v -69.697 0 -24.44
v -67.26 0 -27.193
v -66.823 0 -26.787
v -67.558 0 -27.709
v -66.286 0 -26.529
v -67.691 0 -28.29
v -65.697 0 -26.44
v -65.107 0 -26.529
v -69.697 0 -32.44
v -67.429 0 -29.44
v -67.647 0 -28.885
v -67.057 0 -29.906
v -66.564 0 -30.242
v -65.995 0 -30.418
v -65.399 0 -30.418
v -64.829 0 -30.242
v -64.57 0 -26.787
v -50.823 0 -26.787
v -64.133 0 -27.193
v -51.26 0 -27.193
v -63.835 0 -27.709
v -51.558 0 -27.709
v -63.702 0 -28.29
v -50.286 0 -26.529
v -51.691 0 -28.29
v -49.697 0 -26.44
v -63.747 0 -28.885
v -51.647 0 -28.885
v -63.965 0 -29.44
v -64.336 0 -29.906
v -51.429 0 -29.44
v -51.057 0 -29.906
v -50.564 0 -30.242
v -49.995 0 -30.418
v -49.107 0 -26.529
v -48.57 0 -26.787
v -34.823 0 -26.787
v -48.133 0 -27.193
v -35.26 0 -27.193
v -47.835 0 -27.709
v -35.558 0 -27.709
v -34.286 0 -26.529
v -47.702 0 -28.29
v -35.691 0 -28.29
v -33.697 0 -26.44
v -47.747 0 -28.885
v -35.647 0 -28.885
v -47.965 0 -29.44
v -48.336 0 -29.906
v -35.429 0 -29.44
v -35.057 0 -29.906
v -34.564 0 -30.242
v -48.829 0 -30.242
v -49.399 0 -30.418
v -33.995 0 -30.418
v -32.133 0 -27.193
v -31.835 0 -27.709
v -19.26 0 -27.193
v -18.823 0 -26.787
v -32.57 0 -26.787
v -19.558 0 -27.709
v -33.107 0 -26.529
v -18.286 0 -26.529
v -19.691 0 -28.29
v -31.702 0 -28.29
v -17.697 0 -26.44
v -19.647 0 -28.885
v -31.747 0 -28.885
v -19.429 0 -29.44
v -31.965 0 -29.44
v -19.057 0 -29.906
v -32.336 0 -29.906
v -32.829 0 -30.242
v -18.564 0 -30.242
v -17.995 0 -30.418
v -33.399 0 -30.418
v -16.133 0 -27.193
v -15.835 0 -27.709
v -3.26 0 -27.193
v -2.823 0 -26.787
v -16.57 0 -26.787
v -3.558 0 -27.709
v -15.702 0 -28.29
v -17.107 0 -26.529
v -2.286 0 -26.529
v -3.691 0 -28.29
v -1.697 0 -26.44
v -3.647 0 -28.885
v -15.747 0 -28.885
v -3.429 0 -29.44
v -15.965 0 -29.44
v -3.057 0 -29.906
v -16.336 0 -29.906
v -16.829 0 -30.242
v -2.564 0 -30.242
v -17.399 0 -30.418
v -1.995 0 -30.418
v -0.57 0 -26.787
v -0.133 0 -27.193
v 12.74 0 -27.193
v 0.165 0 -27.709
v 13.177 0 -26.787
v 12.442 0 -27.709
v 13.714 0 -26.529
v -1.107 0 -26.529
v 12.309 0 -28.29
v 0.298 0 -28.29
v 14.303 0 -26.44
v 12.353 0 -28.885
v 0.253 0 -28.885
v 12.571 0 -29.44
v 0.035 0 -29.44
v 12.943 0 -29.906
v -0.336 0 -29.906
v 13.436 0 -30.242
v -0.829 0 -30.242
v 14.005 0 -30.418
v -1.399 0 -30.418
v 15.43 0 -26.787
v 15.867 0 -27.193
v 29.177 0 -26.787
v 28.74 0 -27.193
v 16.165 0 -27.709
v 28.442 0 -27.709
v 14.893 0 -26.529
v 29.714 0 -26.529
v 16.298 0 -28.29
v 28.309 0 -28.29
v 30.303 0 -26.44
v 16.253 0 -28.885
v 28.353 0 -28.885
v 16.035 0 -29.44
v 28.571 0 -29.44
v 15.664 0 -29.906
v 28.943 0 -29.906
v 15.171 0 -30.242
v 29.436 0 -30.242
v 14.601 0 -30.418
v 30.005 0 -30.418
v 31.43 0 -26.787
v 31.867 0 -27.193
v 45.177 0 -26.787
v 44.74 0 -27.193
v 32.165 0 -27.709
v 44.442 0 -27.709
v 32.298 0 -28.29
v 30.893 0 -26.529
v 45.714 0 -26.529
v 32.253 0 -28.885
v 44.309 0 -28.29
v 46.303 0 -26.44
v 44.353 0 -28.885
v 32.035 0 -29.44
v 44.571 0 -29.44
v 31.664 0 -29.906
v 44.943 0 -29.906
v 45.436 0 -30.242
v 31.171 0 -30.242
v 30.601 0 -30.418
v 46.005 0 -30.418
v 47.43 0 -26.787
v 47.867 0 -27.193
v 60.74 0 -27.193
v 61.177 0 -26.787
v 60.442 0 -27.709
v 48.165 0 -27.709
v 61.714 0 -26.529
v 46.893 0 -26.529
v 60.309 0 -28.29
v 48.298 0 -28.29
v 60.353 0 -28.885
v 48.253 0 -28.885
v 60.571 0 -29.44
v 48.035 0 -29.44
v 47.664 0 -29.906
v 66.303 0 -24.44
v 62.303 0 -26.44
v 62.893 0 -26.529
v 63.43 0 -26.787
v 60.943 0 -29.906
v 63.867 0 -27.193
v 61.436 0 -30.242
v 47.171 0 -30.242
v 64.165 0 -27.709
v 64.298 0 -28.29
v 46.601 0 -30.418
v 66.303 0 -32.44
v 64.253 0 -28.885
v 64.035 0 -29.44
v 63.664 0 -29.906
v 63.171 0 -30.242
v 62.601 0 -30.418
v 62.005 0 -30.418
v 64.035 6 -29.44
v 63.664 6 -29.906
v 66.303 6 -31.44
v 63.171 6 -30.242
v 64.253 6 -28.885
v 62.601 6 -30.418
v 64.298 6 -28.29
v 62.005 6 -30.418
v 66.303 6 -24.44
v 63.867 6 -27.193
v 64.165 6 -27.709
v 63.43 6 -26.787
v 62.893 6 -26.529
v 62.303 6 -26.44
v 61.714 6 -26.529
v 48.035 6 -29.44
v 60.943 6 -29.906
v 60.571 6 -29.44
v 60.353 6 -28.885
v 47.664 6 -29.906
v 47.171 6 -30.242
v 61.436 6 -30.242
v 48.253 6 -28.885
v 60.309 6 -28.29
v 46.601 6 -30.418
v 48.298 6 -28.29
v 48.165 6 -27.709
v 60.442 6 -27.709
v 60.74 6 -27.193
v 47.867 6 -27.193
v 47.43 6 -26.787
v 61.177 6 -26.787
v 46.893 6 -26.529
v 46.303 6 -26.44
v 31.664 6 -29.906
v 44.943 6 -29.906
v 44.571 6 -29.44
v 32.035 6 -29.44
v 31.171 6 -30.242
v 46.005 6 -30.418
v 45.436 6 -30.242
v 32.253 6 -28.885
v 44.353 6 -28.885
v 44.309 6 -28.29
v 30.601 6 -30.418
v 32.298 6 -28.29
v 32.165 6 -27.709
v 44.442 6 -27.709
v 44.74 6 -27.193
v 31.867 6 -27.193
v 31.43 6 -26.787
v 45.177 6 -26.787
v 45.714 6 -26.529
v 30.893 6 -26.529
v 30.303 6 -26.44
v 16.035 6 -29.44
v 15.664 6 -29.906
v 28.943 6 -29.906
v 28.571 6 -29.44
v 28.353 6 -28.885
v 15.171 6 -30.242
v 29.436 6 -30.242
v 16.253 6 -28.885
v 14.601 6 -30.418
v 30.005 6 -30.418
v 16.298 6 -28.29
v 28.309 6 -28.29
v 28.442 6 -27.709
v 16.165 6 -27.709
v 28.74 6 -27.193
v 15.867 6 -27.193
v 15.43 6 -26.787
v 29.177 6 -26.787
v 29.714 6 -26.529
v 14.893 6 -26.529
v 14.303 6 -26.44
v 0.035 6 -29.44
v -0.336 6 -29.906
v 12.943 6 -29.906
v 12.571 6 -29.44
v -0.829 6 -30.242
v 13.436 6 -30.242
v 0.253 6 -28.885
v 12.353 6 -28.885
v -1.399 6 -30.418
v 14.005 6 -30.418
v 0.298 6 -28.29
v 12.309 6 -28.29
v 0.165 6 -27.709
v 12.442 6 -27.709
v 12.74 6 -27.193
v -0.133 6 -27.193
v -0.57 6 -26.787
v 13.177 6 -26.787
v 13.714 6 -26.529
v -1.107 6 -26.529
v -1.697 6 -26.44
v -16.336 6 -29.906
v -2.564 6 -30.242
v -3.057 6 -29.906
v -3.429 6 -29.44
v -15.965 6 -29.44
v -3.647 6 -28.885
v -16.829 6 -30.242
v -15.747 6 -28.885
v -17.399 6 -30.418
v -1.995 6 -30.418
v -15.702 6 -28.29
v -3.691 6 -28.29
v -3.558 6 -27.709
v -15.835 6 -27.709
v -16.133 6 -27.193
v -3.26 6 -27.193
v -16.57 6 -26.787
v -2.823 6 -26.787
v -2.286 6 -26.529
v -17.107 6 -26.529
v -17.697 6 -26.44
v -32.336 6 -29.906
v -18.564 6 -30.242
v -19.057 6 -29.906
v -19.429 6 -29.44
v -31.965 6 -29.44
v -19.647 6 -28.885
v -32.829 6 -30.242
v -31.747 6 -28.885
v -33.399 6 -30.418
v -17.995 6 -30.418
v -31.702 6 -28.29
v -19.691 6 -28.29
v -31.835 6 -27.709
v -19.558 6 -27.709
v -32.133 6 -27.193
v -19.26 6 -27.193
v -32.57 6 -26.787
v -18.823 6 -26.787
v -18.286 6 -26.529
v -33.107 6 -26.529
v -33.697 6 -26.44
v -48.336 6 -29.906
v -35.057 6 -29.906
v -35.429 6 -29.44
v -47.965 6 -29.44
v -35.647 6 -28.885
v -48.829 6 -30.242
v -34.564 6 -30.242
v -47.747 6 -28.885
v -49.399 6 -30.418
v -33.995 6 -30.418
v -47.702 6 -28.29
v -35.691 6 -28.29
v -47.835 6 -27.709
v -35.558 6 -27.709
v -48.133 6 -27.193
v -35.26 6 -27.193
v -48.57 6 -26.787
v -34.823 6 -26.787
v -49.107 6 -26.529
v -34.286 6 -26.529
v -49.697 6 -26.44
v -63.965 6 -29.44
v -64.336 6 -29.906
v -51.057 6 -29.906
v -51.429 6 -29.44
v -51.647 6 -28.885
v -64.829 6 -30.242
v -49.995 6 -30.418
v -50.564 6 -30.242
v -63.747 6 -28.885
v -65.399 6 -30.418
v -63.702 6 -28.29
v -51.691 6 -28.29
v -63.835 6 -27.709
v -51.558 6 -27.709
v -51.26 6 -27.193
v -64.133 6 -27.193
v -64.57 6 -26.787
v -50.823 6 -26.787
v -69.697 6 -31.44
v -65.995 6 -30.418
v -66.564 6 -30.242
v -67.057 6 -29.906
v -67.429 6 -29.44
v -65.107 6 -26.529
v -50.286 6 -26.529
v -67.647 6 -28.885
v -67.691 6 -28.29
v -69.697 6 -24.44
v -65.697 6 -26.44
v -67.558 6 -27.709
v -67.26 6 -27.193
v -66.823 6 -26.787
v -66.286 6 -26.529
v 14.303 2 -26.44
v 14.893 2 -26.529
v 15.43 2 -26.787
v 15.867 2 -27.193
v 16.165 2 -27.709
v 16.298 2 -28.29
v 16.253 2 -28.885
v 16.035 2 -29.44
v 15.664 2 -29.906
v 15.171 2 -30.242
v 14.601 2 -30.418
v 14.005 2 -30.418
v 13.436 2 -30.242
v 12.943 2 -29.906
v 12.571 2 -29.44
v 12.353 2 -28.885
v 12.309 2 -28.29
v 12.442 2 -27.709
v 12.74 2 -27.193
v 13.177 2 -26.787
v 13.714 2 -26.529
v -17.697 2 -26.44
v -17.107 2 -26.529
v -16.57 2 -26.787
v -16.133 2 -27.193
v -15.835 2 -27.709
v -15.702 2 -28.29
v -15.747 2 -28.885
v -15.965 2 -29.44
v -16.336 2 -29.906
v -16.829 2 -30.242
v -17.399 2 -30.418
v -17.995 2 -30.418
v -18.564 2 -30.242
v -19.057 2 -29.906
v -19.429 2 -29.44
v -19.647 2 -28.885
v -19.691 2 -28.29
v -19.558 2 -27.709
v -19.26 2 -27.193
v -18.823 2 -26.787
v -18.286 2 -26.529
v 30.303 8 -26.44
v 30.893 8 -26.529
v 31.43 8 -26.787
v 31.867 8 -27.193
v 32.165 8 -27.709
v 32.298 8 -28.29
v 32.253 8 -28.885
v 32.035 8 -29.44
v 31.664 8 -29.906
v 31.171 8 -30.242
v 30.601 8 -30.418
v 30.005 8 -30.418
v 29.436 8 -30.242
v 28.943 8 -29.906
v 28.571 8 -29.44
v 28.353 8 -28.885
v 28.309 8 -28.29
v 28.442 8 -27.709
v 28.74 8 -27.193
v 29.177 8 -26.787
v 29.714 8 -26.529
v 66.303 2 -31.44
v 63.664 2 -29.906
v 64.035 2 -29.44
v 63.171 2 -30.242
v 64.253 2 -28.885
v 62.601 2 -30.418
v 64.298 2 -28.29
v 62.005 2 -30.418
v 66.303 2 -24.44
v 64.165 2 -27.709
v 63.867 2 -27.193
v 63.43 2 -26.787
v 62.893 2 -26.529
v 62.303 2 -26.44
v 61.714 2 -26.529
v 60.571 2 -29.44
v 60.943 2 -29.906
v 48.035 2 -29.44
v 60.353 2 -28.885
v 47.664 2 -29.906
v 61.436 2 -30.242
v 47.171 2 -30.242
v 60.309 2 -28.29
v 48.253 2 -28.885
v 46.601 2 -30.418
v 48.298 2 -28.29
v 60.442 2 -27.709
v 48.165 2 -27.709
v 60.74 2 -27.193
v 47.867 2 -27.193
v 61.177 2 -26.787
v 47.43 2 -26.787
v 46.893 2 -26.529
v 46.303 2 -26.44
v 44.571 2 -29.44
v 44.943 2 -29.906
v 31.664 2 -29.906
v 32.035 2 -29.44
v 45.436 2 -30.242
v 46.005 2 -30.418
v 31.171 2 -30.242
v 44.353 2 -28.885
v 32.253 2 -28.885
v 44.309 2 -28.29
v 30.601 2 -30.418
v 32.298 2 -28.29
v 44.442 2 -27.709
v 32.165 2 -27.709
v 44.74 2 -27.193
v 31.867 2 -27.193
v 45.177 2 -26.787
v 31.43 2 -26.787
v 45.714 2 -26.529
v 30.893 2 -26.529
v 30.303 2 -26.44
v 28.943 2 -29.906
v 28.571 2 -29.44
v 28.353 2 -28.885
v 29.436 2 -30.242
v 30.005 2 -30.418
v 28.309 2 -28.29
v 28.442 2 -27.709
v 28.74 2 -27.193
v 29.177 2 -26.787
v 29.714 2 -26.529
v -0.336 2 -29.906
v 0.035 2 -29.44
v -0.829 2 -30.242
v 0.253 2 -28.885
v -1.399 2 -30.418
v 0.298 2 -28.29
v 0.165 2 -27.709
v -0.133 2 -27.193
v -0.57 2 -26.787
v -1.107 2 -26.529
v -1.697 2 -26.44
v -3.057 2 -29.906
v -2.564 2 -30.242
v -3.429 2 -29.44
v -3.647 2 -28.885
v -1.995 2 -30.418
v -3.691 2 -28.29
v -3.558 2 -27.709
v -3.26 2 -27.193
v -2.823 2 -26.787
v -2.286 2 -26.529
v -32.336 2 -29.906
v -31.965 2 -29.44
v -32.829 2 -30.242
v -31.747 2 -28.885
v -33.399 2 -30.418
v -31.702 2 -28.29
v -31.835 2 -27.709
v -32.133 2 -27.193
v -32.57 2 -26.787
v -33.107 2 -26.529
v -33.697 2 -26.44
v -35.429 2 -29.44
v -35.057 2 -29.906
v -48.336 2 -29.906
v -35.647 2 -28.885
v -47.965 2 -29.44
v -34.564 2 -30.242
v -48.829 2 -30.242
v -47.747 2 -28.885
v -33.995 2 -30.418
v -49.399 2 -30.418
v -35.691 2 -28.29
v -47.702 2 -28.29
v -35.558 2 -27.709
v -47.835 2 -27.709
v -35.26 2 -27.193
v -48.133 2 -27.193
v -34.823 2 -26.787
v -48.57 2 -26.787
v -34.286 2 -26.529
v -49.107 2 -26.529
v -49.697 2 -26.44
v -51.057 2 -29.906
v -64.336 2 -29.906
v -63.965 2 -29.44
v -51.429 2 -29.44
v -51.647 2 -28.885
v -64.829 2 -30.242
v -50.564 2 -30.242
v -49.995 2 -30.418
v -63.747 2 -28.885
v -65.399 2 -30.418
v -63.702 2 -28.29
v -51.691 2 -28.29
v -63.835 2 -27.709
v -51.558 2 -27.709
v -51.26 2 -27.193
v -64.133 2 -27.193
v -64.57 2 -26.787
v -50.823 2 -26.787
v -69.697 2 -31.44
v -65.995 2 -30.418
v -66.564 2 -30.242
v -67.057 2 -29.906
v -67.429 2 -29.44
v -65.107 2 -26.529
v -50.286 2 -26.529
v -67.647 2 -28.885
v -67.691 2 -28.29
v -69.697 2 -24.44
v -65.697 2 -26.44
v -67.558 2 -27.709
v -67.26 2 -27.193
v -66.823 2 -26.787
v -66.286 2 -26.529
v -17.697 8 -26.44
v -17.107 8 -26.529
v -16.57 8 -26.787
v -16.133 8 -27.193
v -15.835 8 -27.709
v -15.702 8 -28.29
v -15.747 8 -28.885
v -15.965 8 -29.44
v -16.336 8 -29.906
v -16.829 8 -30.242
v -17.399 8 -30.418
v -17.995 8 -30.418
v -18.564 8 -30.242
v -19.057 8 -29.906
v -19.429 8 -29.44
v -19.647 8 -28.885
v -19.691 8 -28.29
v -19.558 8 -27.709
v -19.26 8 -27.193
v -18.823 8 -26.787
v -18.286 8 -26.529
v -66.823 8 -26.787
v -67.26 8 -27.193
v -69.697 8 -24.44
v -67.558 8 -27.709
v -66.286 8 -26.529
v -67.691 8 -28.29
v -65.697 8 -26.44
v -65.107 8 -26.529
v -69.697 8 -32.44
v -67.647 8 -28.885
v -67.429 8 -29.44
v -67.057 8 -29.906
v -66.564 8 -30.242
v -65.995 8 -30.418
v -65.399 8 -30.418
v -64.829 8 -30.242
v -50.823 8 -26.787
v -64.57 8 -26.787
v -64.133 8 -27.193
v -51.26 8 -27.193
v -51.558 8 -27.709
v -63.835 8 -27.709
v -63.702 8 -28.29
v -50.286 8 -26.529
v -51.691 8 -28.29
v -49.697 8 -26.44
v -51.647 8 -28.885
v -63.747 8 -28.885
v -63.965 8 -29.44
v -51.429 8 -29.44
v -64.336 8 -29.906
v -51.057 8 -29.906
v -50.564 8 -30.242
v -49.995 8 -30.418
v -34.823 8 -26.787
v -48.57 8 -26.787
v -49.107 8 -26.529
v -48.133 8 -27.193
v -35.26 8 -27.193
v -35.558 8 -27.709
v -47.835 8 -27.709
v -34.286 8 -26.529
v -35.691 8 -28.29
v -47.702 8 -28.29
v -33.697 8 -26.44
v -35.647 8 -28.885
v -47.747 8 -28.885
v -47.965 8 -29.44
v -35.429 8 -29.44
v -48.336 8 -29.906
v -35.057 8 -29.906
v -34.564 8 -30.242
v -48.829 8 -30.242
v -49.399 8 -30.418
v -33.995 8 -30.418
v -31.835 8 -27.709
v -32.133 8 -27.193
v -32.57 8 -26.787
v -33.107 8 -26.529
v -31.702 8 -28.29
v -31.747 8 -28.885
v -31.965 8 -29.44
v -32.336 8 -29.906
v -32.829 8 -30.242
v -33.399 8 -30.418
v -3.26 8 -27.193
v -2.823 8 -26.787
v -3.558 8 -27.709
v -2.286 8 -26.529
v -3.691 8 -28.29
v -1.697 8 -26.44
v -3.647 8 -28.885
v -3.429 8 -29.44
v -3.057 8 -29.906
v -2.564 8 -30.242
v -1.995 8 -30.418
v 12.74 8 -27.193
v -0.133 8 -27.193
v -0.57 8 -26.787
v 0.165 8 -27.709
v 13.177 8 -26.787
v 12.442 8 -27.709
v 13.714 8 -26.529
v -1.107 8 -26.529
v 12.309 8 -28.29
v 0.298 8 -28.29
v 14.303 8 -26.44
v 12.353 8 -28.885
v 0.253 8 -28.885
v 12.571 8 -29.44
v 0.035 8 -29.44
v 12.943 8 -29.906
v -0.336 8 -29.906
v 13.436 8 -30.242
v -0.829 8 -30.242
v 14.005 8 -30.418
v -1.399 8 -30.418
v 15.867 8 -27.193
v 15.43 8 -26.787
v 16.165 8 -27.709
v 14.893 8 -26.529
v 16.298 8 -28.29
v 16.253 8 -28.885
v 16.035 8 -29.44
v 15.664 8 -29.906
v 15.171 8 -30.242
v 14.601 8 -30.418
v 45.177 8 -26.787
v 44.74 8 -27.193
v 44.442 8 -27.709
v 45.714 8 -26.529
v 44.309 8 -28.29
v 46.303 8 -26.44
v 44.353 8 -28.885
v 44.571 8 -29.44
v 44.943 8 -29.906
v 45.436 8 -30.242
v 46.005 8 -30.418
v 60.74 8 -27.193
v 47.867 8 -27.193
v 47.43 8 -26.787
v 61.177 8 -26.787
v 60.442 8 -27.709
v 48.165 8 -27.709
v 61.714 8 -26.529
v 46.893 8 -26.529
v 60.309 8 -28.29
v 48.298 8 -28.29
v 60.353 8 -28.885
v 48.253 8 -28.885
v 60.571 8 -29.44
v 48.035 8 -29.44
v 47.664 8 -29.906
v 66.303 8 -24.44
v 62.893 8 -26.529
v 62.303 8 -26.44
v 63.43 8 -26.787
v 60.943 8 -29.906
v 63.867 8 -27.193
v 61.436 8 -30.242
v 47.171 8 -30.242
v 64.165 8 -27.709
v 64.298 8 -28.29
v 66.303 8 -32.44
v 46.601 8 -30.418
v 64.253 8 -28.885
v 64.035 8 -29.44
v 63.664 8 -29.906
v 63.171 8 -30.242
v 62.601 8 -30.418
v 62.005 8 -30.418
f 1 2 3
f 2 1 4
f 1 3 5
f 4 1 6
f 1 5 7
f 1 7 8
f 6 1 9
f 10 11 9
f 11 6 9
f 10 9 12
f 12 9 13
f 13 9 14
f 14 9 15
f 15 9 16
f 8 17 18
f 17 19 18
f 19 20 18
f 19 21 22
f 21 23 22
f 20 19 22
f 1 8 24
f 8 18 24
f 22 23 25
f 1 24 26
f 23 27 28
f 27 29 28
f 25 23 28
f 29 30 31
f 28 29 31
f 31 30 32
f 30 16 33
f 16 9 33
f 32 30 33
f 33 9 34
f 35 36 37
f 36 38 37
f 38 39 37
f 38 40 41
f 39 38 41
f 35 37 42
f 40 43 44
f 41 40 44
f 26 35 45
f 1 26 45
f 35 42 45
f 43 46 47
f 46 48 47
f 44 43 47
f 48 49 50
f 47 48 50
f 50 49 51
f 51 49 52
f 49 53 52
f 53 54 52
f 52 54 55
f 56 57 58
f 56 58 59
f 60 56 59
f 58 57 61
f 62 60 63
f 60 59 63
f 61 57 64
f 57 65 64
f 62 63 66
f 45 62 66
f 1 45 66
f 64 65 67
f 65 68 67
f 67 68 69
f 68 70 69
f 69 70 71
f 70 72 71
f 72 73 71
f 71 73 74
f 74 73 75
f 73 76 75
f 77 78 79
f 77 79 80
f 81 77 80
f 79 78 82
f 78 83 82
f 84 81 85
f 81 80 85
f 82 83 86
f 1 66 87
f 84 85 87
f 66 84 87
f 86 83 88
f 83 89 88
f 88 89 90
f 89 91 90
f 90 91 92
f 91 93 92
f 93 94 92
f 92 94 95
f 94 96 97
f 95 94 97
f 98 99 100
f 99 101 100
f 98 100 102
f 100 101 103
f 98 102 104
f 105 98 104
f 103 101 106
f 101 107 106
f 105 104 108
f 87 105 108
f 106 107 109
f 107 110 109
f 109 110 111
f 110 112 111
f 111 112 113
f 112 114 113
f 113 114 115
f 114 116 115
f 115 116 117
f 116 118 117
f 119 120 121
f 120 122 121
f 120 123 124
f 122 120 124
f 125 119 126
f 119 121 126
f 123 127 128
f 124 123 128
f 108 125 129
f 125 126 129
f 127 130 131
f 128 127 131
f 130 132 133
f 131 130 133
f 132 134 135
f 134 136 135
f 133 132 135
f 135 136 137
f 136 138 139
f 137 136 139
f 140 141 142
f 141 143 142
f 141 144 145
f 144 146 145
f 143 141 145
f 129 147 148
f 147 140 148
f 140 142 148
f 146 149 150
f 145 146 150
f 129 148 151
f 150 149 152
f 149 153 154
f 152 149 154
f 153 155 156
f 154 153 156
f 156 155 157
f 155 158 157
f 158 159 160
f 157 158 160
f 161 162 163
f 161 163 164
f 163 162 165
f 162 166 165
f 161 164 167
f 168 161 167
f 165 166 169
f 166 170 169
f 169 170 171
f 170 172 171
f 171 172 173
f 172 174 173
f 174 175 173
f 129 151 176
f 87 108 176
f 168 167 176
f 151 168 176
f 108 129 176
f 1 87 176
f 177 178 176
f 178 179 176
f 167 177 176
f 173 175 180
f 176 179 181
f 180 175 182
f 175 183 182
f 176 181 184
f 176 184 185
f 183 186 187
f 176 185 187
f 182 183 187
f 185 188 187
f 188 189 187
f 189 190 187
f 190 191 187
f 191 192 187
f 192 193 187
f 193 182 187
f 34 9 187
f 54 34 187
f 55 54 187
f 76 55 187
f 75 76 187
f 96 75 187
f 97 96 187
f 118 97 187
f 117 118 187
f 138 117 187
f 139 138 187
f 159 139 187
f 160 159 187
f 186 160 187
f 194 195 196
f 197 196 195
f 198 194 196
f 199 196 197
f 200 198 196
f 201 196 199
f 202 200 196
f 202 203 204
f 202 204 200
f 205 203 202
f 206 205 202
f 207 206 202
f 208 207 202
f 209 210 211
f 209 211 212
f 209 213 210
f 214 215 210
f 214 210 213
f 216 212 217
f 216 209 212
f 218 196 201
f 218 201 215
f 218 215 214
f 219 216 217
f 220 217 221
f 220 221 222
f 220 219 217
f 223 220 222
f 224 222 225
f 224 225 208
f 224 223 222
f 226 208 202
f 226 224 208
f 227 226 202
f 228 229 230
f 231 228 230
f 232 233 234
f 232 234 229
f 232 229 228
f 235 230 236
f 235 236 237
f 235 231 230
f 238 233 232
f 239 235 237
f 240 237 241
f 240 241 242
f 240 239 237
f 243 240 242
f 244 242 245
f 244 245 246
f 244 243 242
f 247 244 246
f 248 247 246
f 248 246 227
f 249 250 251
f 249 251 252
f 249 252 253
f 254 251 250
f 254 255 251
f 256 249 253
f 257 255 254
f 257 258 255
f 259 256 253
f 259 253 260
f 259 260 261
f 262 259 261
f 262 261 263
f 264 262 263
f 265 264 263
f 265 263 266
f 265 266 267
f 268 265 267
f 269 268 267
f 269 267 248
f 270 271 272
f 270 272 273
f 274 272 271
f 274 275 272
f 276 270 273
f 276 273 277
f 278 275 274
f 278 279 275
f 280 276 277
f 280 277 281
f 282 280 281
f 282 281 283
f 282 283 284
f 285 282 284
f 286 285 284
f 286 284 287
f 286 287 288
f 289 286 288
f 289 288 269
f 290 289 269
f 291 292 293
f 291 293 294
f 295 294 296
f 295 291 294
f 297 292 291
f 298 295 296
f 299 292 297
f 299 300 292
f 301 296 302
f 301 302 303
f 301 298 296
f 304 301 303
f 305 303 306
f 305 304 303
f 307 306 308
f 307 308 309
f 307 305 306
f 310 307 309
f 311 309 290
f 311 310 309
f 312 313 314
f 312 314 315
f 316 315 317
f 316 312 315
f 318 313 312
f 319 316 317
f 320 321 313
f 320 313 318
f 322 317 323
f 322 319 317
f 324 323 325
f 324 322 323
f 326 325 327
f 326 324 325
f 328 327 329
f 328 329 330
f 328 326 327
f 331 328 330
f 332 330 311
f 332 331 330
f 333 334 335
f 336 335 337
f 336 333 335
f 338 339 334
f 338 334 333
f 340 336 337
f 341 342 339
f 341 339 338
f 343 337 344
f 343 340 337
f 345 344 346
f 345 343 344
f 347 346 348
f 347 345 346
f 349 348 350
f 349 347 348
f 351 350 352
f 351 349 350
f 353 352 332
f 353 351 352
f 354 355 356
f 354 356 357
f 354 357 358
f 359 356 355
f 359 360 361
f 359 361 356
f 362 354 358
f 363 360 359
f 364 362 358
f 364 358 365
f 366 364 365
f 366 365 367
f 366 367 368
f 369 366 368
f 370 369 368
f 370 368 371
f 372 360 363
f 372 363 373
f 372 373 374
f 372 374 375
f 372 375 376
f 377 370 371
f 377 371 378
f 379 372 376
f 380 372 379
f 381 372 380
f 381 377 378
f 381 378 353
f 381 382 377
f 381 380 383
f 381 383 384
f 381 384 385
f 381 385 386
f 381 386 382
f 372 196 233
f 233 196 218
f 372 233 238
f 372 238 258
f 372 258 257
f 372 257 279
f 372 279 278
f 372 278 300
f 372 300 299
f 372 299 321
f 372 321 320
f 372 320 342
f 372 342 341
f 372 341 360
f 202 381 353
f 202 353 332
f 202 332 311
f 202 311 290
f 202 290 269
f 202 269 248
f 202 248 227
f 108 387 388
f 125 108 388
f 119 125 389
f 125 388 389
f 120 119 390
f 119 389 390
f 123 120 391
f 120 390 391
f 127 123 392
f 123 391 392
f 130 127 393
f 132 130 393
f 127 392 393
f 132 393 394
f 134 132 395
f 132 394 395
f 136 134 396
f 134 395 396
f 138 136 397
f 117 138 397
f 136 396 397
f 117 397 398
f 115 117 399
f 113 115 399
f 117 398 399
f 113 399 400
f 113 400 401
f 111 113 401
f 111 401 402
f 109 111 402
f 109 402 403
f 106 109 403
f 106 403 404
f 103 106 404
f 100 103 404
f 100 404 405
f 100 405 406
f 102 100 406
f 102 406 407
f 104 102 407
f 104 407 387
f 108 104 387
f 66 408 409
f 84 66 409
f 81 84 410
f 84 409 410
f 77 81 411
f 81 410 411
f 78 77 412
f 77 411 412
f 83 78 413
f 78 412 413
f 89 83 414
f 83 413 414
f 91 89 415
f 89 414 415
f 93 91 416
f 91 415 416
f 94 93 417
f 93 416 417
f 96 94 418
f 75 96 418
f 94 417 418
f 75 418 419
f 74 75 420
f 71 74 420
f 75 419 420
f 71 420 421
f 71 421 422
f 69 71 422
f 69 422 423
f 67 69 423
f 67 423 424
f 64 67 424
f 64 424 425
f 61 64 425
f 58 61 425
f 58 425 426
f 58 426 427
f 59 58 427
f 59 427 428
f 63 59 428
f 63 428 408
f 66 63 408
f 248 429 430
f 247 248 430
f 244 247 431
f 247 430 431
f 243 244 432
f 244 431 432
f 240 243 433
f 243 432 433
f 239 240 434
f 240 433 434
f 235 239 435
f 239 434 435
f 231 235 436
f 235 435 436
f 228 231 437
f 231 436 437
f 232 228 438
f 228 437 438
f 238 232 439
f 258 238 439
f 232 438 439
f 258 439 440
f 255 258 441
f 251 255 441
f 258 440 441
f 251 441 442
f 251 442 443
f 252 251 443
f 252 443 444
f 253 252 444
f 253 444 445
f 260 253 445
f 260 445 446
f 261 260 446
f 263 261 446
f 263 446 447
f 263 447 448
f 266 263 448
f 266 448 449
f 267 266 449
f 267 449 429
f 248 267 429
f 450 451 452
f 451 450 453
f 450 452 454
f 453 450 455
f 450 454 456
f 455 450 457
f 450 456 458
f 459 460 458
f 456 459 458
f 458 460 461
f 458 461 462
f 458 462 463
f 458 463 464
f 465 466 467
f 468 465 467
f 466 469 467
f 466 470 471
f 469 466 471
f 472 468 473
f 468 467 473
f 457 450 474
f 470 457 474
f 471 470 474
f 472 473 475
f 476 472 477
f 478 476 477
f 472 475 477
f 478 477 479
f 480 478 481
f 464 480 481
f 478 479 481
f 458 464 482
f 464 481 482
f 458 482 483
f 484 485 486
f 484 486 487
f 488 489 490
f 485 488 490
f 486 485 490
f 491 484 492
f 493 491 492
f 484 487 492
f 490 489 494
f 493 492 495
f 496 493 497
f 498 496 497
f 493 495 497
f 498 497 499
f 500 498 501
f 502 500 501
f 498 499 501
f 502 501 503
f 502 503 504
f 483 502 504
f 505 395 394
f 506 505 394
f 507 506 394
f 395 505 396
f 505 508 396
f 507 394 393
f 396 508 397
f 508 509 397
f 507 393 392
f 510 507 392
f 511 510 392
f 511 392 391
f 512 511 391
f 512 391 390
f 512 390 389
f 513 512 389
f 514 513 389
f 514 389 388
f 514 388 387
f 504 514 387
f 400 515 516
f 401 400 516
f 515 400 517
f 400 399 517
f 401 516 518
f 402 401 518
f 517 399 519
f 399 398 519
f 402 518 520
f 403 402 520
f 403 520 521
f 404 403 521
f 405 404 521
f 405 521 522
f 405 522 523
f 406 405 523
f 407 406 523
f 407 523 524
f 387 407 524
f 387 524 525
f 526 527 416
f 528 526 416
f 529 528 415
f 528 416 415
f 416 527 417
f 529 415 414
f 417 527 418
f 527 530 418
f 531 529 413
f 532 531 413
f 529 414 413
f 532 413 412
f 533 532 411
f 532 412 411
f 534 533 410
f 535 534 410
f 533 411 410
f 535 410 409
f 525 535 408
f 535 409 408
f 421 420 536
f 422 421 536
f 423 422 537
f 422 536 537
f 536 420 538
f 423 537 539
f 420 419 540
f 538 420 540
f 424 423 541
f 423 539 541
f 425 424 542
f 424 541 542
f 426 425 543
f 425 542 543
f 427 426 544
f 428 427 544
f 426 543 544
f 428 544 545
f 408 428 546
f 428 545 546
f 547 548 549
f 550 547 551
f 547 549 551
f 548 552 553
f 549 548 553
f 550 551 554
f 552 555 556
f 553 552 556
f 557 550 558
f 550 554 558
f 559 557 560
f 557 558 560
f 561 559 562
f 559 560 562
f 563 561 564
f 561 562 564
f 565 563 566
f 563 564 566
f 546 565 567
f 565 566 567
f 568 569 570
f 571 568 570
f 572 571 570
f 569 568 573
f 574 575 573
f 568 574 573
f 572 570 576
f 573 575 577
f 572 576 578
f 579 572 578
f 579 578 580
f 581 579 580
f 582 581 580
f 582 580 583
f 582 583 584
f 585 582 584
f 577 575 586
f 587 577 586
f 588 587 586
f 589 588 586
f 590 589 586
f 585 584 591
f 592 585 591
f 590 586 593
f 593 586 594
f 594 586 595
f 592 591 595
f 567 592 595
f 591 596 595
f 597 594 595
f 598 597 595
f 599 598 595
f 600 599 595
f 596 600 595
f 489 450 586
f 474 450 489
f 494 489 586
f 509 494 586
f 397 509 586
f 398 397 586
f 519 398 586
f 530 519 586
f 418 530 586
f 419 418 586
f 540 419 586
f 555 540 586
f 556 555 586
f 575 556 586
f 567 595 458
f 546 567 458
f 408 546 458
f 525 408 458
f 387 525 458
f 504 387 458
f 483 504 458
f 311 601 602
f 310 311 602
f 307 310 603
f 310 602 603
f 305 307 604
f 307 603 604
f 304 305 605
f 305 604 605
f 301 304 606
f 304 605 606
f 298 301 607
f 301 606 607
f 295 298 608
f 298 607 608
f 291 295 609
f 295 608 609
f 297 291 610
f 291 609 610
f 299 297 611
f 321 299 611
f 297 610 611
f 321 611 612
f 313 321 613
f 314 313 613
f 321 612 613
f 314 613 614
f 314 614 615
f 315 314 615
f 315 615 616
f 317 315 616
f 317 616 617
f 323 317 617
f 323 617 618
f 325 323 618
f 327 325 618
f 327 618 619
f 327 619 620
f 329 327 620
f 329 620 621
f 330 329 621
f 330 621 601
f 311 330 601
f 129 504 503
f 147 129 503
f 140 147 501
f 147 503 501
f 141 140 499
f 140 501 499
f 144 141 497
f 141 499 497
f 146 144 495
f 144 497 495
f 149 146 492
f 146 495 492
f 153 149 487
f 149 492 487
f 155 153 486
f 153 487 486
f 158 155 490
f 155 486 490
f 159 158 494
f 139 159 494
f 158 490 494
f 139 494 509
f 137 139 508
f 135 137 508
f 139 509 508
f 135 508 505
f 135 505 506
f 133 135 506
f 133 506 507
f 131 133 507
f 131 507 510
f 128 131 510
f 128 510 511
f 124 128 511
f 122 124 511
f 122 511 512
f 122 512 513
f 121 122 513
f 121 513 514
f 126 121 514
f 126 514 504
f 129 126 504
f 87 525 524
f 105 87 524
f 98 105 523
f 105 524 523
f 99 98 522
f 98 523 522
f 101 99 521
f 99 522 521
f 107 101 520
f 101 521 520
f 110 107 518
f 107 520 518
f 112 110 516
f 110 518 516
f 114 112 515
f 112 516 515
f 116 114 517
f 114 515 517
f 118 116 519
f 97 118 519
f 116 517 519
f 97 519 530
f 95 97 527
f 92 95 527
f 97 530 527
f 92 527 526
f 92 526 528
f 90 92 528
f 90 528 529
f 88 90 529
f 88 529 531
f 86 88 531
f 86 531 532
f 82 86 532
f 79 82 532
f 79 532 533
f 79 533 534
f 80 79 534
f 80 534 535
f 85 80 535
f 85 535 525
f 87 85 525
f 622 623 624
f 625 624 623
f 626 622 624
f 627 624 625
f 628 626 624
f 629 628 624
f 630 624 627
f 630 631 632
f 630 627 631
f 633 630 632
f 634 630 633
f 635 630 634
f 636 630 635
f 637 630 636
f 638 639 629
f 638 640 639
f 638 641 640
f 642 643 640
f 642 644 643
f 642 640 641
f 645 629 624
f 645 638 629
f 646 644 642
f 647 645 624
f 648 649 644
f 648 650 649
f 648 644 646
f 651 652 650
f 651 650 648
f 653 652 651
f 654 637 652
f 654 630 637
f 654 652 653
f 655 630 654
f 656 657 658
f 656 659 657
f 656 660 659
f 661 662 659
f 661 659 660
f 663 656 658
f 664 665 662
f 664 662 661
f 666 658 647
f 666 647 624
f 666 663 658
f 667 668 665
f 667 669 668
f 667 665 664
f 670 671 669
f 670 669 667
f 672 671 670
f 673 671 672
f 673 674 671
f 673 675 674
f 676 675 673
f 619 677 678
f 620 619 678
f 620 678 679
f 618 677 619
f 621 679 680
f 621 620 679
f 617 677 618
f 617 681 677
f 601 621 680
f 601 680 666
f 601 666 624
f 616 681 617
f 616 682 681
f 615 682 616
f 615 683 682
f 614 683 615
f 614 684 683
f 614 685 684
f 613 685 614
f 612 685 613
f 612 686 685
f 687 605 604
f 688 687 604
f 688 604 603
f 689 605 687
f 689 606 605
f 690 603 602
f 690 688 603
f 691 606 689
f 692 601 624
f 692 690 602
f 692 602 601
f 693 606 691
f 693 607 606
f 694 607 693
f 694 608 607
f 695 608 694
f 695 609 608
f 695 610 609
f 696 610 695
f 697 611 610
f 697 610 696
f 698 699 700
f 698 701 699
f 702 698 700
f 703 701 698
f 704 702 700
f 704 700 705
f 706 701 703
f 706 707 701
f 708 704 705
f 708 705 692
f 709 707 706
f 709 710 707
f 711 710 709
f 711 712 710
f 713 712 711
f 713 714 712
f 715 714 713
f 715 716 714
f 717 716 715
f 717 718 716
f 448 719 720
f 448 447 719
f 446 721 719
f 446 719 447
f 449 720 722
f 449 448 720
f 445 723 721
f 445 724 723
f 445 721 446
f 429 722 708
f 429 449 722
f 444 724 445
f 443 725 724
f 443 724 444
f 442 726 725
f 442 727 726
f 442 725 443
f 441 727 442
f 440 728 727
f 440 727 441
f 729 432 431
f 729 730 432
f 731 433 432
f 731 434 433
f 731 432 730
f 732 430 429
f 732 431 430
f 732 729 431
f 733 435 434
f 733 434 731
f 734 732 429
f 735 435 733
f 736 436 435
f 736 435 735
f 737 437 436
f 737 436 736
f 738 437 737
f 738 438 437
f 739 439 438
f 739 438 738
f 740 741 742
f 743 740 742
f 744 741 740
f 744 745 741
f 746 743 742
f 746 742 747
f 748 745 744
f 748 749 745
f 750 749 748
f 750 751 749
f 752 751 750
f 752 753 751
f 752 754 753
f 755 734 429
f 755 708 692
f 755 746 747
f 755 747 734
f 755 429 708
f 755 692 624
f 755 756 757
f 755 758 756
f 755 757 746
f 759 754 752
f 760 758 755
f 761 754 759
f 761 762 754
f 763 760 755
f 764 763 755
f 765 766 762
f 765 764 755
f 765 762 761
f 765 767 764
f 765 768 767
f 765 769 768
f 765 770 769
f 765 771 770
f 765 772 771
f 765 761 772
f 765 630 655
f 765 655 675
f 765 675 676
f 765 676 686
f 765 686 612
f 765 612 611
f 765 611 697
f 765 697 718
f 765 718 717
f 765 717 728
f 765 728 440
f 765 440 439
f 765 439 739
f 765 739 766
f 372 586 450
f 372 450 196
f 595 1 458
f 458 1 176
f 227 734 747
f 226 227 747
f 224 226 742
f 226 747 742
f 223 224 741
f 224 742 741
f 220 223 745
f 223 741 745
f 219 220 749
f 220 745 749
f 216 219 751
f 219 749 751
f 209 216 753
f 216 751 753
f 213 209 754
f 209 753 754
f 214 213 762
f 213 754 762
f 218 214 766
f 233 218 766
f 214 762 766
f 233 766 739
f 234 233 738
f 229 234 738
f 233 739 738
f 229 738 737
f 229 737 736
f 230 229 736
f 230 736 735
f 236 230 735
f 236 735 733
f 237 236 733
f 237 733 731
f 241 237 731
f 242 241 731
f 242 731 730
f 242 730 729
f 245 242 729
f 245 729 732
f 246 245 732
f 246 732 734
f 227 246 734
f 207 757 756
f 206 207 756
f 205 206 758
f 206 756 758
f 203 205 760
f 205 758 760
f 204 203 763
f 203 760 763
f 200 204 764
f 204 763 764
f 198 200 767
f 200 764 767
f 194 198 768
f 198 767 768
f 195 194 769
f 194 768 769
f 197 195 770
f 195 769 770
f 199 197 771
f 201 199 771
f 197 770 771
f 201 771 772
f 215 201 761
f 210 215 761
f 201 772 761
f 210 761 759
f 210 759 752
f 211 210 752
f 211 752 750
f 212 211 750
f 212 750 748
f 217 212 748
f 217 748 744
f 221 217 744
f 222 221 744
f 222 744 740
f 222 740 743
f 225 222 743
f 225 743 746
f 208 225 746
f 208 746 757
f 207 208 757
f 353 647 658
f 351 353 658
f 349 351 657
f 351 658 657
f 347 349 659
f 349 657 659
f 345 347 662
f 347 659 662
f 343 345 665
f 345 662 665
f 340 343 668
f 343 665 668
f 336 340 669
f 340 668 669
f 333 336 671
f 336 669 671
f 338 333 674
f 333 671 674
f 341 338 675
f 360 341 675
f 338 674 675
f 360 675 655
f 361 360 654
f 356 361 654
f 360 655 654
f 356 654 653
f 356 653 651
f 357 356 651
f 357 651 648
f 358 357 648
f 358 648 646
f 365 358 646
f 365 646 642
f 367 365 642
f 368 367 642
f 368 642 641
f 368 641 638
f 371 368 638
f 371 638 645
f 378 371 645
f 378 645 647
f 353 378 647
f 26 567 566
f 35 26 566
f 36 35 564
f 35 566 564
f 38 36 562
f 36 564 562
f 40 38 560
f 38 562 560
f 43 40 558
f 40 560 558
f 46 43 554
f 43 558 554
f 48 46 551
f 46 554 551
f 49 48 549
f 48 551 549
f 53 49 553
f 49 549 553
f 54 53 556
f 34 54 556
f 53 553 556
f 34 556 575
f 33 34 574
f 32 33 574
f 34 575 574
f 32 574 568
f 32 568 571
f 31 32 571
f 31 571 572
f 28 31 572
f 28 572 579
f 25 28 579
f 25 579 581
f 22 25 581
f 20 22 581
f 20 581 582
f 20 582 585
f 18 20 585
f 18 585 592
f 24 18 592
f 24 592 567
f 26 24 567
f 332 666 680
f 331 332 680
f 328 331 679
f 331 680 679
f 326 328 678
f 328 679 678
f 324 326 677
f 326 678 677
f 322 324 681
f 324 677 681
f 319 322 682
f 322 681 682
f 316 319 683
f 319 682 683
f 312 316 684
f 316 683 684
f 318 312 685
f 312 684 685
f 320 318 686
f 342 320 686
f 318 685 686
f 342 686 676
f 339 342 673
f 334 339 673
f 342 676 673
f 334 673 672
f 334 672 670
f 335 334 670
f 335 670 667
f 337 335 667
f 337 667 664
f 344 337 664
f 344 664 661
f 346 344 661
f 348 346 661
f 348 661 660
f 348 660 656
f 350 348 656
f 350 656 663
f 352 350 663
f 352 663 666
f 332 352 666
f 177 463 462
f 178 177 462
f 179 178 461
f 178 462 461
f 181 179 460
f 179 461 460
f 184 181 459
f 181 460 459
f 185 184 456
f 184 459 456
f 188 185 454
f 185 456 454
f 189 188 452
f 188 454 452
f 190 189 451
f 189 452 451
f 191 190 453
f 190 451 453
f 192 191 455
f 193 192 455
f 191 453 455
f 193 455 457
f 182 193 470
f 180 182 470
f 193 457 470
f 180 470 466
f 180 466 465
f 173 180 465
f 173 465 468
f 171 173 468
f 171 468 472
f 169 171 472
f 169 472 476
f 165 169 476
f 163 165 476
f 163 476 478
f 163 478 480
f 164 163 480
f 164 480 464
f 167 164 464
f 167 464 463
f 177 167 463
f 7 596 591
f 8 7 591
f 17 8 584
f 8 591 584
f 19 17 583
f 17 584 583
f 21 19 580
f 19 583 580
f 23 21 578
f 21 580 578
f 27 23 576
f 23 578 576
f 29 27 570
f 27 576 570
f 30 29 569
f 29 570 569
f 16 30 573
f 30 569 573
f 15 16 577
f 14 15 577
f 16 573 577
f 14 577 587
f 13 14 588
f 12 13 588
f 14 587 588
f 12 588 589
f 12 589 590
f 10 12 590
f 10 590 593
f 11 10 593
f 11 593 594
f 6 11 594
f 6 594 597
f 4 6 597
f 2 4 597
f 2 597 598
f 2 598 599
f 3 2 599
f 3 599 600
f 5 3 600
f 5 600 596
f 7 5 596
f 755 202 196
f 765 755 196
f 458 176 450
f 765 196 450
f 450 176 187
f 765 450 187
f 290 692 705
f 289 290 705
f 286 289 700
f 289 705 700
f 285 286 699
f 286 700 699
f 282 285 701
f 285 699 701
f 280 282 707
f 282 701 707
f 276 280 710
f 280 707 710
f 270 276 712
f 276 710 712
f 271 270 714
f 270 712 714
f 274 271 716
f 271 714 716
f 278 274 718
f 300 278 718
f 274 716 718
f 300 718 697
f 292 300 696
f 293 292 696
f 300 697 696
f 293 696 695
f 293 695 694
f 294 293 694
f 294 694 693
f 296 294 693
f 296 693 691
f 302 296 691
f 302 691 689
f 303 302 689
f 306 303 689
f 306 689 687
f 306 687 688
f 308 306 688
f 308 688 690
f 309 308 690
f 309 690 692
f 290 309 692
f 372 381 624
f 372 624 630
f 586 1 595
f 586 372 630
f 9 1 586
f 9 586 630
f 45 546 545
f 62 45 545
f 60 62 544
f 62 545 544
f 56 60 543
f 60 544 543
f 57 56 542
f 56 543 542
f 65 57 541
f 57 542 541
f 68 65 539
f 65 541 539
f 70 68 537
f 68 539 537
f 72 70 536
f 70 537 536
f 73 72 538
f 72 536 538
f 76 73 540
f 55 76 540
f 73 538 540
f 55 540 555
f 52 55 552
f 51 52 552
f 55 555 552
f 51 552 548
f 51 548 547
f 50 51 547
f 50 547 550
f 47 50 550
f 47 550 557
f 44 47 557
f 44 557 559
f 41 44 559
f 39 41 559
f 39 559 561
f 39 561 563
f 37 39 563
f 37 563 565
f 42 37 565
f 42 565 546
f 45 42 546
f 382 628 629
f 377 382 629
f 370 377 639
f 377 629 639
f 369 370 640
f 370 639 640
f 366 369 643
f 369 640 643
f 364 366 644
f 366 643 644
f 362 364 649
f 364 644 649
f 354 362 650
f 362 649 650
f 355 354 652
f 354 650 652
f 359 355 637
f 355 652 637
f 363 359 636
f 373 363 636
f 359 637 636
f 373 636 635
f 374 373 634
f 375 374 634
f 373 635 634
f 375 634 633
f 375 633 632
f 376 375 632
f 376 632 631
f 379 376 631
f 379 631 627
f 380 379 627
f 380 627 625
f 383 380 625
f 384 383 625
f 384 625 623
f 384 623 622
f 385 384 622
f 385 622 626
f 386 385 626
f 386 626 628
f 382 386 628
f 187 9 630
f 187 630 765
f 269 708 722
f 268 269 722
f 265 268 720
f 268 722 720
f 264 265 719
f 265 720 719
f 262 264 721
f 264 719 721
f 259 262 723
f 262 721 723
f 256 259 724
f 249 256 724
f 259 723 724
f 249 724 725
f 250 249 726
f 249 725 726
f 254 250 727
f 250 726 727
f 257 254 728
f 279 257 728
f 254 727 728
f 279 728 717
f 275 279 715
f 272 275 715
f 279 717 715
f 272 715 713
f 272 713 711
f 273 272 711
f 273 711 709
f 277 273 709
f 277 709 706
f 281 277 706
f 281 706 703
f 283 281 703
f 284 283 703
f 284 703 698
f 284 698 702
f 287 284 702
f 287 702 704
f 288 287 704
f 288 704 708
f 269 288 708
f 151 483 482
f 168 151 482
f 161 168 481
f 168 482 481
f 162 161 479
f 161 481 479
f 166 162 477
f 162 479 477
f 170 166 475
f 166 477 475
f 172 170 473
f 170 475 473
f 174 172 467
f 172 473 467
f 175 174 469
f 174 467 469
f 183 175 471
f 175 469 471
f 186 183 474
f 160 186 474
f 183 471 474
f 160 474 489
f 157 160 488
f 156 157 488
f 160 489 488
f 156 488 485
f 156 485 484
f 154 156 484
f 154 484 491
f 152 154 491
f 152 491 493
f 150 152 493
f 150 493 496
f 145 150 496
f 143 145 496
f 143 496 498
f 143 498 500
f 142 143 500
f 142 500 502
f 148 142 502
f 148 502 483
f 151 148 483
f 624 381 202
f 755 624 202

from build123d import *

# Parameters (mm, degrees)
SKETCH1_W           = 136
SKETCH1_H           = 8
BOSS_EXTRUDE1_DEPTH = 8
SKETCH2_W           = 7
SKETCH2_H           = 4
CUT_EXTRUDE1_DEPTH  = 142
SKETCH3_R           = 2
CUT_EXTRUDE2_DEPTH  = 142


with BuildPart() as part:
    # Sketch1 → Boss-Extrude1 (new body)
    with BuildSketch(Plane(origin=(0, 0, 0), x_dir=(1, 0, 0), z_dir=(0, 1, 0))):
        with Locations((-1.696732132, 28.439939714)):
            Rectangle(SKETCH1_W, SKETCH1_H)
    extrude(amount=BOSS_EXTRUDE1_DEPTH)

    # Sketch2 → Cut-Extrude1 (cut)
    with BuildSketch(Plane.ZY.offset(69.696732132)):
        with Locations((-27.939939714, 4)):
            Rectangle(SKETCH2_W, SKETCH2_H)
    extrude(amount=-CUT_EXTRUDE1_DEPTH, mode=Mode.SUBTRACT)

    # Sketch3 → Cut-Extrude2 (cut)
    with BuildSketch(Plane(origin=(0, 8, 0), x_dir=(1, 0, 0), z_dir=(0, 1, 0))):
        with Locations(Location((-65.696732132, 28.439939714, 0), (0, 0, 270))):
            Circle(SKETCH3_R)
        with Locations(Location((-49.696732132, 28.439939714, 0), (0, 0, 270))):
            Circle(SKETCH3_R)
        with Locations(Location((-33.696732132, 28.439939714, 0), (0, 0, 270))):
            Circle(SKETCH3_R)
        with Locations(Location((-17.696732132, 28.439939714, 0), (0, 0, 270))):
            Circle(SKETCH3_R)
        with Locations(Location((-1.696732132, 28.439939714, 0), (0, 0, 270))):
            Circle(SKETCH3_R)
        with Locations(Location((14.303267868, 28.439939714, 0), (0, 0, 270))):
            Circle(SKETCH3_R)
        with Locations(Location((30.303267868, 28.439939714, 0), (0, 0, 270))):
            Circle(SKETCH3_R)
        with Locations(Location((46.303267868, 28.439939714, 0), (0, 0, 270))):
            Circle(SKETCH3_R)
        with Locations(Location((62.303267868, 28.439939714, 0), (0, 0, 270))):
            Circle(SKETCH3_R)
    extrude(amount=-CUT_EXTRUDE2_DEPTH, mode=Mode.SUBTRACT)


solid = part.part
